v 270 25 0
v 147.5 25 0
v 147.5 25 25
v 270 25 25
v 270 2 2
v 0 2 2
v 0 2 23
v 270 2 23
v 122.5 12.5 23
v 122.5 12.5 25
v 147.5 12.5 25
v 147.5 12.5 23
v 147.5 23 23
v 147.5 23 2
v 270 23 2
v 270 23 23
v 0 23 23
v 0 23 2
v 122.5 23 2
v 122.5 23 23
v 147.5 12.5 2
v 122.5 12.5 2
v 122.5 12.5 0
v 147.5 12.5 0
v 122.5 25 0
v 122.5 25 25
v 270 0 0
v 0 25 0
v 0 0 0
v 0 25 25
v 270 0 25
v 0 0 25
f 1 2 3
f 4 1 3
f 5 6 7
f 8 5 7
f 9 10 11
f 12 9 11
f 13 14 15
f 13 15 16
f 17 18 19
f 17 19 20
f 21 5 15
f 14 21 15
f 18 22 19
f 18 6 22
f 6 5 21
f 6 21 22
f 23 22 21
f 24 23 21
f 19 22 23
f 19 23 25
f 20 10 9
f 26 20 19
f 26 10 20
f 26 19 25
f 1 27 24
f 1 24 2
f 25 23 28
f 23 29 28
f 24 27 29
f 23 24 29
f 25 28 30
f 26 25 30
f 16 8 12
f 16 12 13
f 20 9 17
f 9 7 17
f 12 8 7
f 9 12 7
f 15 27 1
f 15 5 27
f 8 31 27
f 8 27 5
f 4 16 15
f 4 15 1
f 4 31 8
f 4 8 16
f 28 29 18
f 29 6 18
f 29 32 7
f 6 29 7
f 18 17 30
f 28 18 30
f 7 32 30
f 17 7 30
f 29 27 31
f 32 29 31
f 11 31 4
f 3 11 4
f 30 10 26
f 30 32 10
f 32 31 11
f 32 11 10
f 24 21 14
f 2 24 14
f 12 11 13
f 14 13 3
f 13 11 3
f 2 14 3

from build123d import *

# Parameters (mm, degrees)
F0_W     = 25
F0_H     = 25
F0_W_2   = 21
F0_H_2   = 21
F1_DEPTH = 270
F2_W     = 25
F2_H     = 12.5
F3_DEPTH = 25.001


with BuildPart() as f1:
    # F0 (on Right) → F1 (new body)
    with BuildSketch(Plane.YZ):
        with Locations((12.5, 12.5)):
            Rectangle(F0_W, F0_H)
        with Locations((12.5, 12.5)):
            Rectangle(F0_W_2, F0_H_2, mode=Mode.SUBTRACT)
    extrude(amount=F1_DEPTH)

    # F2 (on face) → F3 (cut, through all)
    with BuildSketch(Plane.XY.offset(25)):
        with Locations((135, 18.75)):
            Rectangle(F2_W, F2_H)
    extrude(amount=-F3_DEPTH, mode=Mode.SUBTRACT)


solid = f1.part
